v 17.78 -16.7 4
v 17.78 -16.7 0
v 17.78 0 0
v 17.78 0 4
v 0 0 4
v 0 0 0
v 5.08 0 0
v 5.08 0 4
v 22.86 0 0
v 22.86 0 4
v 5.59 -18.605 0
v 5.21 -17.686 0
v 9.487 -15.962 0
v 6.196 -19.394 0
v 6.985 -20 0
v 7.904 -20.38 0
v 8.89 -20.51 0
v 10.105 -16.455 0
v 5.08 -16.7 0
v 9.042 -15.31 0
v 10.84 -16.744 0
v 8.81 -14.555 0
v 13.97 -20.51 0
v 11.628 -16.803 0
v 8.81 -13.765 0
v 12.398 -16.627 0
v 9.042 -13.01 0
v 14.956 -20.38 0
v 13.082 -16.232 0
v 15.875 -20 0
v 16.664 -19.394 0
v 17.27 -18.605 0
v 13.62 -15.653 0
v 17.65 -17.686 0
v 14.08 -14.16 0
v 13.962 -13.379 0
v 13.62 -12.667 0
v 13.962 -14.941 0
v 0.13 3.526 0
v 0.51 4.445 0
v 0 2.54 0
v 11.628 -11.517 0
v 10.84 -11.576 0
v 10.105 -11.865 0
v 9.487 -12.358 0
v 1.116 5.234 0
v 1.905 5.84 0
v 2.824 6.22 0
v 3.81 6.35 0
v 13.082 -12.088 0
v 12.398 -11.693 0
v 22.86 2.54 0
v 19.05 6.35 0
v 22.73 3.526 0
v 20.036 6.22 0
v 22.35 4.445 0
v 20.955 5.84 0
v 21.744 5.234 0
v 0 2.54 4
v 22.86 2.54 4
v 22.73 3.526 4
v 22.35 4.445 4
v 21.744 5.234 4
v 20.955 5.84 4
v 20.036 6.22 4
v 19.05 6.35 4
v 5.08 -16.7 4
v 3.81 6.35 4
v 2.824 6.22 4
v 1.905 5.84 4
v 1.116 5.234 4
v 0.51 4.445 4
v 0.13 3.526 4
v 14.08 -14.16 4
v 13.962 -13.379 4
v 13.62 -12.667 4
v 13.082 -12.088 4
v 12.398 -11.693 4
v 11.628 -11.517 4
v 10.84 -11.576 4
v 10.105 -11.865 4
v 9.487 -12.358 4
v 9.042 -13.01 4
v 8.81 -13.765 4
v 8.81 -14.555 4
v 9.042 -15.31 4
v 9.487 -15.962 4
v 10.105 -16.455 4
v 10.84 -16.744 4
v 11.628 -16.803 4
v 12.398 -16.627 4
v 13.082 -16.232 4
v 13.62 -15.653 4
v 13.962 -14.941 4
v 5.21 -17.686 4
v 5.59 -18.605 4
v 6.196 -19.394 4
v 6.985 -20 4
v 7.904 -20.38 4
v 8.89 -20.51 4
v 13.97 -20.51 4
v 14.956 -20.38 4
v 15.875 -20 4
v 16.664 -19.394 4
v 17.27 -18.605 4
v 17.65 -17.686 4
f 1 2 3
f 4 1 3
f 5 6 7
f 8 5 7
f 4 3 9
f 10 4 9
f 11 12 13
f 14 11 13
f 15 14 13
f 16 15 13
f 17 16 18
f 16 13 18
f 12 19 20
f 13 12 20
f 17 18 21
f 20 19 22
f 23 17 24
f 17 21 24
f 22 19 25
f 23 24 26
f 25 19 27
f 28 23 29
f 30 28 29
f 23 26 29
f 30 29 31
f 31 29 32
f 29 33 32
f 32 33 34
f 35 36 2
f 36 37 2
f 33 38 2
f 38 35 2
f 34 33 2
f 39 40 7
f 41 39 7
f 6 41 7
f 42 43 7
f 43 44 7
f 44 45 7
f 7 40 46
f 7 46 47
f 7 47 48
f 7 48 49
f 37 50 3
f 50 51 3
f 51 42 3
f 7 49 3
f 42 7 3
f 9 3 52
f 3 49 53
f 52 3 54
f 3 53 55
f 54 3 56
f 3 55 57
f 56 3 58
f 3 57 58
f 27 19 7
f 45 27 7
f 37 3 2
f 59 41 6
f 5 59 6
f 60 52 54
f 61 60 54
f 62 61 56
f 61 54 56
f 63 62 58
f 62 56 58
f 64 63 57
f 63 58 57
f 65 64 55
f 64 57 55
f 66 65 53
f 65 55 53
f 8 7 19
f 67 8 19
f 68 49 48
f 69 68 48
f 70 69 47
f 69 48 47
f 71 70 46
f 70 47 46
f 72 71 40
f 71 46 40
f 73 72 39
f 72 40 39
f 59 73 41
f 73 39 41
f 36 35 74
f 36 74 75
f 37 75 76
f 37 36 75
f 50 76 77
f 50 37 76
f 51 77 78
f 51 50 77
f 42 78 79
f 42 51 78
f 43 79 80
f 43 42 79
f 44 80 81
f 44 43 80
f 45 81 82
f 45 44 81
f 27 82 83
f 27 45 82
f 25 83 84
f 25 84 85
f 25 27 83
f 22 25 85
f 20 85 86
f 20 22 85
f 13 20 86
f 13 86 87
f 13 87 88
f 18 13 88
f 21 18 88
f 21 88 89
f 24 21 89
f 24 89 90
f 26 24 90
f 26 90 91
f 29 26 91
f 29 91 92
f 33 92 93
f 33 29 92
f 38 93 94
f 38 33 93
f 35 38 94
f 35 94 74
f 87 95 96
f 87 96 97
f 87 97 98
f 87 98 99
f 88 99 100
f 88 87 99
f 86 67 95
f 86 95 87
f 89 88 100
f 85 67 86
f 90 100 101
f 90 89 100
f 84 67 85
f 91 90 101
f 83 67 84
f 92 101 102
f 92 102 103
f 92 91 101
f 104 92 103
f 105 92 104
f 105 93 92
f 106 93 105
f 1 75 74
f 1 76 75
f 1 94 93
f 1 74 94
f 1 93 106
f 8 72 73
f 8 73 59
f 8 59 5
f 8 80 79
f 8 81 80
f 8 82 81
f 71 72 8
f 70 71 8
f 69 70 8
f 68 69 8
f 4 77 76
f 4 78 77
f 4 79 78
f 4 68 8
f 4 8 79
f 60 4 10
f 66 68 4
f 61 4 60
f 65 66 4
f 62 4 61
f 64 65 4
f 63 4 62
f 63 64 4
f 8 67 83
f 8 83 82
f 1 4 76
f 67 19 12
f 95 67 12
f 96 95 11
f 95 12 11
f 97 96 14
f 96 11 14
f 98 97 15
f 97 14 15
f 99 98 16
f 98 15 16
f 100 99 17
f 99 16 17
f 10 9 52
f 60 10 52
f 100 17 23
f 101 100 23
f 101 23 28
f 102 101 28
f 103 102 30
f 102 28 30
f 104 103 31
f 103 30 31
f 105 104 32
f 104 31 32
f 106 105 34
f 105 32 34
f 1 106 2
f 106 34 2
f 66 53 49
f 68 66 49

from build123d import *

# Parameters (mm, degrees)
SKETCH1_R           = 2.65
BOSS_EXTRUDE1_DEPTH = 4


with BuildPart() as part:
    # Sketch1 → Boss-Extrude1 (new body)
    with BuildSketch(Plane.XY):
        with BuildLine():
            Line((0, 0), (5.08, 0))
            Line((5.08, 0), (5.08, -16.7))
            ThreePointArc((5.08, -16.7), (6.195923164, -19.394076836), (8.89, -20.51))
            Line((8.89, -20.51), (13.97, -20.51))
            ThreePointArc((13.97, -20.51), (16.664076836, -19.394076836), (17.78, -16.7))
            Line((17.78, -16.7), (17.78, 0))
            Line((17.78, 0), (22.86, 0))
            Line((22.86, 0), (22.86, 2.54))
            ThreePointArc((22.86, 2.54), (21.744076836, 5.234076836), (19.05, 6.35))
            Line((19.05, 6.35), (3.81, 6.35))
            ThreePointArc((3.81, 6.35), (1.115923164, 5.234076836), (0, 2.54))
            Line((0, 2.54), (0, 0))
        make_face()
        with Locations((11.43, -14.16)):
            Circle(SKETCH1_R, mode=Mode.SUBTRACT)
    extrude(amount=BOSS_EXTRUDE1_DEPTH)


solid = part.part
